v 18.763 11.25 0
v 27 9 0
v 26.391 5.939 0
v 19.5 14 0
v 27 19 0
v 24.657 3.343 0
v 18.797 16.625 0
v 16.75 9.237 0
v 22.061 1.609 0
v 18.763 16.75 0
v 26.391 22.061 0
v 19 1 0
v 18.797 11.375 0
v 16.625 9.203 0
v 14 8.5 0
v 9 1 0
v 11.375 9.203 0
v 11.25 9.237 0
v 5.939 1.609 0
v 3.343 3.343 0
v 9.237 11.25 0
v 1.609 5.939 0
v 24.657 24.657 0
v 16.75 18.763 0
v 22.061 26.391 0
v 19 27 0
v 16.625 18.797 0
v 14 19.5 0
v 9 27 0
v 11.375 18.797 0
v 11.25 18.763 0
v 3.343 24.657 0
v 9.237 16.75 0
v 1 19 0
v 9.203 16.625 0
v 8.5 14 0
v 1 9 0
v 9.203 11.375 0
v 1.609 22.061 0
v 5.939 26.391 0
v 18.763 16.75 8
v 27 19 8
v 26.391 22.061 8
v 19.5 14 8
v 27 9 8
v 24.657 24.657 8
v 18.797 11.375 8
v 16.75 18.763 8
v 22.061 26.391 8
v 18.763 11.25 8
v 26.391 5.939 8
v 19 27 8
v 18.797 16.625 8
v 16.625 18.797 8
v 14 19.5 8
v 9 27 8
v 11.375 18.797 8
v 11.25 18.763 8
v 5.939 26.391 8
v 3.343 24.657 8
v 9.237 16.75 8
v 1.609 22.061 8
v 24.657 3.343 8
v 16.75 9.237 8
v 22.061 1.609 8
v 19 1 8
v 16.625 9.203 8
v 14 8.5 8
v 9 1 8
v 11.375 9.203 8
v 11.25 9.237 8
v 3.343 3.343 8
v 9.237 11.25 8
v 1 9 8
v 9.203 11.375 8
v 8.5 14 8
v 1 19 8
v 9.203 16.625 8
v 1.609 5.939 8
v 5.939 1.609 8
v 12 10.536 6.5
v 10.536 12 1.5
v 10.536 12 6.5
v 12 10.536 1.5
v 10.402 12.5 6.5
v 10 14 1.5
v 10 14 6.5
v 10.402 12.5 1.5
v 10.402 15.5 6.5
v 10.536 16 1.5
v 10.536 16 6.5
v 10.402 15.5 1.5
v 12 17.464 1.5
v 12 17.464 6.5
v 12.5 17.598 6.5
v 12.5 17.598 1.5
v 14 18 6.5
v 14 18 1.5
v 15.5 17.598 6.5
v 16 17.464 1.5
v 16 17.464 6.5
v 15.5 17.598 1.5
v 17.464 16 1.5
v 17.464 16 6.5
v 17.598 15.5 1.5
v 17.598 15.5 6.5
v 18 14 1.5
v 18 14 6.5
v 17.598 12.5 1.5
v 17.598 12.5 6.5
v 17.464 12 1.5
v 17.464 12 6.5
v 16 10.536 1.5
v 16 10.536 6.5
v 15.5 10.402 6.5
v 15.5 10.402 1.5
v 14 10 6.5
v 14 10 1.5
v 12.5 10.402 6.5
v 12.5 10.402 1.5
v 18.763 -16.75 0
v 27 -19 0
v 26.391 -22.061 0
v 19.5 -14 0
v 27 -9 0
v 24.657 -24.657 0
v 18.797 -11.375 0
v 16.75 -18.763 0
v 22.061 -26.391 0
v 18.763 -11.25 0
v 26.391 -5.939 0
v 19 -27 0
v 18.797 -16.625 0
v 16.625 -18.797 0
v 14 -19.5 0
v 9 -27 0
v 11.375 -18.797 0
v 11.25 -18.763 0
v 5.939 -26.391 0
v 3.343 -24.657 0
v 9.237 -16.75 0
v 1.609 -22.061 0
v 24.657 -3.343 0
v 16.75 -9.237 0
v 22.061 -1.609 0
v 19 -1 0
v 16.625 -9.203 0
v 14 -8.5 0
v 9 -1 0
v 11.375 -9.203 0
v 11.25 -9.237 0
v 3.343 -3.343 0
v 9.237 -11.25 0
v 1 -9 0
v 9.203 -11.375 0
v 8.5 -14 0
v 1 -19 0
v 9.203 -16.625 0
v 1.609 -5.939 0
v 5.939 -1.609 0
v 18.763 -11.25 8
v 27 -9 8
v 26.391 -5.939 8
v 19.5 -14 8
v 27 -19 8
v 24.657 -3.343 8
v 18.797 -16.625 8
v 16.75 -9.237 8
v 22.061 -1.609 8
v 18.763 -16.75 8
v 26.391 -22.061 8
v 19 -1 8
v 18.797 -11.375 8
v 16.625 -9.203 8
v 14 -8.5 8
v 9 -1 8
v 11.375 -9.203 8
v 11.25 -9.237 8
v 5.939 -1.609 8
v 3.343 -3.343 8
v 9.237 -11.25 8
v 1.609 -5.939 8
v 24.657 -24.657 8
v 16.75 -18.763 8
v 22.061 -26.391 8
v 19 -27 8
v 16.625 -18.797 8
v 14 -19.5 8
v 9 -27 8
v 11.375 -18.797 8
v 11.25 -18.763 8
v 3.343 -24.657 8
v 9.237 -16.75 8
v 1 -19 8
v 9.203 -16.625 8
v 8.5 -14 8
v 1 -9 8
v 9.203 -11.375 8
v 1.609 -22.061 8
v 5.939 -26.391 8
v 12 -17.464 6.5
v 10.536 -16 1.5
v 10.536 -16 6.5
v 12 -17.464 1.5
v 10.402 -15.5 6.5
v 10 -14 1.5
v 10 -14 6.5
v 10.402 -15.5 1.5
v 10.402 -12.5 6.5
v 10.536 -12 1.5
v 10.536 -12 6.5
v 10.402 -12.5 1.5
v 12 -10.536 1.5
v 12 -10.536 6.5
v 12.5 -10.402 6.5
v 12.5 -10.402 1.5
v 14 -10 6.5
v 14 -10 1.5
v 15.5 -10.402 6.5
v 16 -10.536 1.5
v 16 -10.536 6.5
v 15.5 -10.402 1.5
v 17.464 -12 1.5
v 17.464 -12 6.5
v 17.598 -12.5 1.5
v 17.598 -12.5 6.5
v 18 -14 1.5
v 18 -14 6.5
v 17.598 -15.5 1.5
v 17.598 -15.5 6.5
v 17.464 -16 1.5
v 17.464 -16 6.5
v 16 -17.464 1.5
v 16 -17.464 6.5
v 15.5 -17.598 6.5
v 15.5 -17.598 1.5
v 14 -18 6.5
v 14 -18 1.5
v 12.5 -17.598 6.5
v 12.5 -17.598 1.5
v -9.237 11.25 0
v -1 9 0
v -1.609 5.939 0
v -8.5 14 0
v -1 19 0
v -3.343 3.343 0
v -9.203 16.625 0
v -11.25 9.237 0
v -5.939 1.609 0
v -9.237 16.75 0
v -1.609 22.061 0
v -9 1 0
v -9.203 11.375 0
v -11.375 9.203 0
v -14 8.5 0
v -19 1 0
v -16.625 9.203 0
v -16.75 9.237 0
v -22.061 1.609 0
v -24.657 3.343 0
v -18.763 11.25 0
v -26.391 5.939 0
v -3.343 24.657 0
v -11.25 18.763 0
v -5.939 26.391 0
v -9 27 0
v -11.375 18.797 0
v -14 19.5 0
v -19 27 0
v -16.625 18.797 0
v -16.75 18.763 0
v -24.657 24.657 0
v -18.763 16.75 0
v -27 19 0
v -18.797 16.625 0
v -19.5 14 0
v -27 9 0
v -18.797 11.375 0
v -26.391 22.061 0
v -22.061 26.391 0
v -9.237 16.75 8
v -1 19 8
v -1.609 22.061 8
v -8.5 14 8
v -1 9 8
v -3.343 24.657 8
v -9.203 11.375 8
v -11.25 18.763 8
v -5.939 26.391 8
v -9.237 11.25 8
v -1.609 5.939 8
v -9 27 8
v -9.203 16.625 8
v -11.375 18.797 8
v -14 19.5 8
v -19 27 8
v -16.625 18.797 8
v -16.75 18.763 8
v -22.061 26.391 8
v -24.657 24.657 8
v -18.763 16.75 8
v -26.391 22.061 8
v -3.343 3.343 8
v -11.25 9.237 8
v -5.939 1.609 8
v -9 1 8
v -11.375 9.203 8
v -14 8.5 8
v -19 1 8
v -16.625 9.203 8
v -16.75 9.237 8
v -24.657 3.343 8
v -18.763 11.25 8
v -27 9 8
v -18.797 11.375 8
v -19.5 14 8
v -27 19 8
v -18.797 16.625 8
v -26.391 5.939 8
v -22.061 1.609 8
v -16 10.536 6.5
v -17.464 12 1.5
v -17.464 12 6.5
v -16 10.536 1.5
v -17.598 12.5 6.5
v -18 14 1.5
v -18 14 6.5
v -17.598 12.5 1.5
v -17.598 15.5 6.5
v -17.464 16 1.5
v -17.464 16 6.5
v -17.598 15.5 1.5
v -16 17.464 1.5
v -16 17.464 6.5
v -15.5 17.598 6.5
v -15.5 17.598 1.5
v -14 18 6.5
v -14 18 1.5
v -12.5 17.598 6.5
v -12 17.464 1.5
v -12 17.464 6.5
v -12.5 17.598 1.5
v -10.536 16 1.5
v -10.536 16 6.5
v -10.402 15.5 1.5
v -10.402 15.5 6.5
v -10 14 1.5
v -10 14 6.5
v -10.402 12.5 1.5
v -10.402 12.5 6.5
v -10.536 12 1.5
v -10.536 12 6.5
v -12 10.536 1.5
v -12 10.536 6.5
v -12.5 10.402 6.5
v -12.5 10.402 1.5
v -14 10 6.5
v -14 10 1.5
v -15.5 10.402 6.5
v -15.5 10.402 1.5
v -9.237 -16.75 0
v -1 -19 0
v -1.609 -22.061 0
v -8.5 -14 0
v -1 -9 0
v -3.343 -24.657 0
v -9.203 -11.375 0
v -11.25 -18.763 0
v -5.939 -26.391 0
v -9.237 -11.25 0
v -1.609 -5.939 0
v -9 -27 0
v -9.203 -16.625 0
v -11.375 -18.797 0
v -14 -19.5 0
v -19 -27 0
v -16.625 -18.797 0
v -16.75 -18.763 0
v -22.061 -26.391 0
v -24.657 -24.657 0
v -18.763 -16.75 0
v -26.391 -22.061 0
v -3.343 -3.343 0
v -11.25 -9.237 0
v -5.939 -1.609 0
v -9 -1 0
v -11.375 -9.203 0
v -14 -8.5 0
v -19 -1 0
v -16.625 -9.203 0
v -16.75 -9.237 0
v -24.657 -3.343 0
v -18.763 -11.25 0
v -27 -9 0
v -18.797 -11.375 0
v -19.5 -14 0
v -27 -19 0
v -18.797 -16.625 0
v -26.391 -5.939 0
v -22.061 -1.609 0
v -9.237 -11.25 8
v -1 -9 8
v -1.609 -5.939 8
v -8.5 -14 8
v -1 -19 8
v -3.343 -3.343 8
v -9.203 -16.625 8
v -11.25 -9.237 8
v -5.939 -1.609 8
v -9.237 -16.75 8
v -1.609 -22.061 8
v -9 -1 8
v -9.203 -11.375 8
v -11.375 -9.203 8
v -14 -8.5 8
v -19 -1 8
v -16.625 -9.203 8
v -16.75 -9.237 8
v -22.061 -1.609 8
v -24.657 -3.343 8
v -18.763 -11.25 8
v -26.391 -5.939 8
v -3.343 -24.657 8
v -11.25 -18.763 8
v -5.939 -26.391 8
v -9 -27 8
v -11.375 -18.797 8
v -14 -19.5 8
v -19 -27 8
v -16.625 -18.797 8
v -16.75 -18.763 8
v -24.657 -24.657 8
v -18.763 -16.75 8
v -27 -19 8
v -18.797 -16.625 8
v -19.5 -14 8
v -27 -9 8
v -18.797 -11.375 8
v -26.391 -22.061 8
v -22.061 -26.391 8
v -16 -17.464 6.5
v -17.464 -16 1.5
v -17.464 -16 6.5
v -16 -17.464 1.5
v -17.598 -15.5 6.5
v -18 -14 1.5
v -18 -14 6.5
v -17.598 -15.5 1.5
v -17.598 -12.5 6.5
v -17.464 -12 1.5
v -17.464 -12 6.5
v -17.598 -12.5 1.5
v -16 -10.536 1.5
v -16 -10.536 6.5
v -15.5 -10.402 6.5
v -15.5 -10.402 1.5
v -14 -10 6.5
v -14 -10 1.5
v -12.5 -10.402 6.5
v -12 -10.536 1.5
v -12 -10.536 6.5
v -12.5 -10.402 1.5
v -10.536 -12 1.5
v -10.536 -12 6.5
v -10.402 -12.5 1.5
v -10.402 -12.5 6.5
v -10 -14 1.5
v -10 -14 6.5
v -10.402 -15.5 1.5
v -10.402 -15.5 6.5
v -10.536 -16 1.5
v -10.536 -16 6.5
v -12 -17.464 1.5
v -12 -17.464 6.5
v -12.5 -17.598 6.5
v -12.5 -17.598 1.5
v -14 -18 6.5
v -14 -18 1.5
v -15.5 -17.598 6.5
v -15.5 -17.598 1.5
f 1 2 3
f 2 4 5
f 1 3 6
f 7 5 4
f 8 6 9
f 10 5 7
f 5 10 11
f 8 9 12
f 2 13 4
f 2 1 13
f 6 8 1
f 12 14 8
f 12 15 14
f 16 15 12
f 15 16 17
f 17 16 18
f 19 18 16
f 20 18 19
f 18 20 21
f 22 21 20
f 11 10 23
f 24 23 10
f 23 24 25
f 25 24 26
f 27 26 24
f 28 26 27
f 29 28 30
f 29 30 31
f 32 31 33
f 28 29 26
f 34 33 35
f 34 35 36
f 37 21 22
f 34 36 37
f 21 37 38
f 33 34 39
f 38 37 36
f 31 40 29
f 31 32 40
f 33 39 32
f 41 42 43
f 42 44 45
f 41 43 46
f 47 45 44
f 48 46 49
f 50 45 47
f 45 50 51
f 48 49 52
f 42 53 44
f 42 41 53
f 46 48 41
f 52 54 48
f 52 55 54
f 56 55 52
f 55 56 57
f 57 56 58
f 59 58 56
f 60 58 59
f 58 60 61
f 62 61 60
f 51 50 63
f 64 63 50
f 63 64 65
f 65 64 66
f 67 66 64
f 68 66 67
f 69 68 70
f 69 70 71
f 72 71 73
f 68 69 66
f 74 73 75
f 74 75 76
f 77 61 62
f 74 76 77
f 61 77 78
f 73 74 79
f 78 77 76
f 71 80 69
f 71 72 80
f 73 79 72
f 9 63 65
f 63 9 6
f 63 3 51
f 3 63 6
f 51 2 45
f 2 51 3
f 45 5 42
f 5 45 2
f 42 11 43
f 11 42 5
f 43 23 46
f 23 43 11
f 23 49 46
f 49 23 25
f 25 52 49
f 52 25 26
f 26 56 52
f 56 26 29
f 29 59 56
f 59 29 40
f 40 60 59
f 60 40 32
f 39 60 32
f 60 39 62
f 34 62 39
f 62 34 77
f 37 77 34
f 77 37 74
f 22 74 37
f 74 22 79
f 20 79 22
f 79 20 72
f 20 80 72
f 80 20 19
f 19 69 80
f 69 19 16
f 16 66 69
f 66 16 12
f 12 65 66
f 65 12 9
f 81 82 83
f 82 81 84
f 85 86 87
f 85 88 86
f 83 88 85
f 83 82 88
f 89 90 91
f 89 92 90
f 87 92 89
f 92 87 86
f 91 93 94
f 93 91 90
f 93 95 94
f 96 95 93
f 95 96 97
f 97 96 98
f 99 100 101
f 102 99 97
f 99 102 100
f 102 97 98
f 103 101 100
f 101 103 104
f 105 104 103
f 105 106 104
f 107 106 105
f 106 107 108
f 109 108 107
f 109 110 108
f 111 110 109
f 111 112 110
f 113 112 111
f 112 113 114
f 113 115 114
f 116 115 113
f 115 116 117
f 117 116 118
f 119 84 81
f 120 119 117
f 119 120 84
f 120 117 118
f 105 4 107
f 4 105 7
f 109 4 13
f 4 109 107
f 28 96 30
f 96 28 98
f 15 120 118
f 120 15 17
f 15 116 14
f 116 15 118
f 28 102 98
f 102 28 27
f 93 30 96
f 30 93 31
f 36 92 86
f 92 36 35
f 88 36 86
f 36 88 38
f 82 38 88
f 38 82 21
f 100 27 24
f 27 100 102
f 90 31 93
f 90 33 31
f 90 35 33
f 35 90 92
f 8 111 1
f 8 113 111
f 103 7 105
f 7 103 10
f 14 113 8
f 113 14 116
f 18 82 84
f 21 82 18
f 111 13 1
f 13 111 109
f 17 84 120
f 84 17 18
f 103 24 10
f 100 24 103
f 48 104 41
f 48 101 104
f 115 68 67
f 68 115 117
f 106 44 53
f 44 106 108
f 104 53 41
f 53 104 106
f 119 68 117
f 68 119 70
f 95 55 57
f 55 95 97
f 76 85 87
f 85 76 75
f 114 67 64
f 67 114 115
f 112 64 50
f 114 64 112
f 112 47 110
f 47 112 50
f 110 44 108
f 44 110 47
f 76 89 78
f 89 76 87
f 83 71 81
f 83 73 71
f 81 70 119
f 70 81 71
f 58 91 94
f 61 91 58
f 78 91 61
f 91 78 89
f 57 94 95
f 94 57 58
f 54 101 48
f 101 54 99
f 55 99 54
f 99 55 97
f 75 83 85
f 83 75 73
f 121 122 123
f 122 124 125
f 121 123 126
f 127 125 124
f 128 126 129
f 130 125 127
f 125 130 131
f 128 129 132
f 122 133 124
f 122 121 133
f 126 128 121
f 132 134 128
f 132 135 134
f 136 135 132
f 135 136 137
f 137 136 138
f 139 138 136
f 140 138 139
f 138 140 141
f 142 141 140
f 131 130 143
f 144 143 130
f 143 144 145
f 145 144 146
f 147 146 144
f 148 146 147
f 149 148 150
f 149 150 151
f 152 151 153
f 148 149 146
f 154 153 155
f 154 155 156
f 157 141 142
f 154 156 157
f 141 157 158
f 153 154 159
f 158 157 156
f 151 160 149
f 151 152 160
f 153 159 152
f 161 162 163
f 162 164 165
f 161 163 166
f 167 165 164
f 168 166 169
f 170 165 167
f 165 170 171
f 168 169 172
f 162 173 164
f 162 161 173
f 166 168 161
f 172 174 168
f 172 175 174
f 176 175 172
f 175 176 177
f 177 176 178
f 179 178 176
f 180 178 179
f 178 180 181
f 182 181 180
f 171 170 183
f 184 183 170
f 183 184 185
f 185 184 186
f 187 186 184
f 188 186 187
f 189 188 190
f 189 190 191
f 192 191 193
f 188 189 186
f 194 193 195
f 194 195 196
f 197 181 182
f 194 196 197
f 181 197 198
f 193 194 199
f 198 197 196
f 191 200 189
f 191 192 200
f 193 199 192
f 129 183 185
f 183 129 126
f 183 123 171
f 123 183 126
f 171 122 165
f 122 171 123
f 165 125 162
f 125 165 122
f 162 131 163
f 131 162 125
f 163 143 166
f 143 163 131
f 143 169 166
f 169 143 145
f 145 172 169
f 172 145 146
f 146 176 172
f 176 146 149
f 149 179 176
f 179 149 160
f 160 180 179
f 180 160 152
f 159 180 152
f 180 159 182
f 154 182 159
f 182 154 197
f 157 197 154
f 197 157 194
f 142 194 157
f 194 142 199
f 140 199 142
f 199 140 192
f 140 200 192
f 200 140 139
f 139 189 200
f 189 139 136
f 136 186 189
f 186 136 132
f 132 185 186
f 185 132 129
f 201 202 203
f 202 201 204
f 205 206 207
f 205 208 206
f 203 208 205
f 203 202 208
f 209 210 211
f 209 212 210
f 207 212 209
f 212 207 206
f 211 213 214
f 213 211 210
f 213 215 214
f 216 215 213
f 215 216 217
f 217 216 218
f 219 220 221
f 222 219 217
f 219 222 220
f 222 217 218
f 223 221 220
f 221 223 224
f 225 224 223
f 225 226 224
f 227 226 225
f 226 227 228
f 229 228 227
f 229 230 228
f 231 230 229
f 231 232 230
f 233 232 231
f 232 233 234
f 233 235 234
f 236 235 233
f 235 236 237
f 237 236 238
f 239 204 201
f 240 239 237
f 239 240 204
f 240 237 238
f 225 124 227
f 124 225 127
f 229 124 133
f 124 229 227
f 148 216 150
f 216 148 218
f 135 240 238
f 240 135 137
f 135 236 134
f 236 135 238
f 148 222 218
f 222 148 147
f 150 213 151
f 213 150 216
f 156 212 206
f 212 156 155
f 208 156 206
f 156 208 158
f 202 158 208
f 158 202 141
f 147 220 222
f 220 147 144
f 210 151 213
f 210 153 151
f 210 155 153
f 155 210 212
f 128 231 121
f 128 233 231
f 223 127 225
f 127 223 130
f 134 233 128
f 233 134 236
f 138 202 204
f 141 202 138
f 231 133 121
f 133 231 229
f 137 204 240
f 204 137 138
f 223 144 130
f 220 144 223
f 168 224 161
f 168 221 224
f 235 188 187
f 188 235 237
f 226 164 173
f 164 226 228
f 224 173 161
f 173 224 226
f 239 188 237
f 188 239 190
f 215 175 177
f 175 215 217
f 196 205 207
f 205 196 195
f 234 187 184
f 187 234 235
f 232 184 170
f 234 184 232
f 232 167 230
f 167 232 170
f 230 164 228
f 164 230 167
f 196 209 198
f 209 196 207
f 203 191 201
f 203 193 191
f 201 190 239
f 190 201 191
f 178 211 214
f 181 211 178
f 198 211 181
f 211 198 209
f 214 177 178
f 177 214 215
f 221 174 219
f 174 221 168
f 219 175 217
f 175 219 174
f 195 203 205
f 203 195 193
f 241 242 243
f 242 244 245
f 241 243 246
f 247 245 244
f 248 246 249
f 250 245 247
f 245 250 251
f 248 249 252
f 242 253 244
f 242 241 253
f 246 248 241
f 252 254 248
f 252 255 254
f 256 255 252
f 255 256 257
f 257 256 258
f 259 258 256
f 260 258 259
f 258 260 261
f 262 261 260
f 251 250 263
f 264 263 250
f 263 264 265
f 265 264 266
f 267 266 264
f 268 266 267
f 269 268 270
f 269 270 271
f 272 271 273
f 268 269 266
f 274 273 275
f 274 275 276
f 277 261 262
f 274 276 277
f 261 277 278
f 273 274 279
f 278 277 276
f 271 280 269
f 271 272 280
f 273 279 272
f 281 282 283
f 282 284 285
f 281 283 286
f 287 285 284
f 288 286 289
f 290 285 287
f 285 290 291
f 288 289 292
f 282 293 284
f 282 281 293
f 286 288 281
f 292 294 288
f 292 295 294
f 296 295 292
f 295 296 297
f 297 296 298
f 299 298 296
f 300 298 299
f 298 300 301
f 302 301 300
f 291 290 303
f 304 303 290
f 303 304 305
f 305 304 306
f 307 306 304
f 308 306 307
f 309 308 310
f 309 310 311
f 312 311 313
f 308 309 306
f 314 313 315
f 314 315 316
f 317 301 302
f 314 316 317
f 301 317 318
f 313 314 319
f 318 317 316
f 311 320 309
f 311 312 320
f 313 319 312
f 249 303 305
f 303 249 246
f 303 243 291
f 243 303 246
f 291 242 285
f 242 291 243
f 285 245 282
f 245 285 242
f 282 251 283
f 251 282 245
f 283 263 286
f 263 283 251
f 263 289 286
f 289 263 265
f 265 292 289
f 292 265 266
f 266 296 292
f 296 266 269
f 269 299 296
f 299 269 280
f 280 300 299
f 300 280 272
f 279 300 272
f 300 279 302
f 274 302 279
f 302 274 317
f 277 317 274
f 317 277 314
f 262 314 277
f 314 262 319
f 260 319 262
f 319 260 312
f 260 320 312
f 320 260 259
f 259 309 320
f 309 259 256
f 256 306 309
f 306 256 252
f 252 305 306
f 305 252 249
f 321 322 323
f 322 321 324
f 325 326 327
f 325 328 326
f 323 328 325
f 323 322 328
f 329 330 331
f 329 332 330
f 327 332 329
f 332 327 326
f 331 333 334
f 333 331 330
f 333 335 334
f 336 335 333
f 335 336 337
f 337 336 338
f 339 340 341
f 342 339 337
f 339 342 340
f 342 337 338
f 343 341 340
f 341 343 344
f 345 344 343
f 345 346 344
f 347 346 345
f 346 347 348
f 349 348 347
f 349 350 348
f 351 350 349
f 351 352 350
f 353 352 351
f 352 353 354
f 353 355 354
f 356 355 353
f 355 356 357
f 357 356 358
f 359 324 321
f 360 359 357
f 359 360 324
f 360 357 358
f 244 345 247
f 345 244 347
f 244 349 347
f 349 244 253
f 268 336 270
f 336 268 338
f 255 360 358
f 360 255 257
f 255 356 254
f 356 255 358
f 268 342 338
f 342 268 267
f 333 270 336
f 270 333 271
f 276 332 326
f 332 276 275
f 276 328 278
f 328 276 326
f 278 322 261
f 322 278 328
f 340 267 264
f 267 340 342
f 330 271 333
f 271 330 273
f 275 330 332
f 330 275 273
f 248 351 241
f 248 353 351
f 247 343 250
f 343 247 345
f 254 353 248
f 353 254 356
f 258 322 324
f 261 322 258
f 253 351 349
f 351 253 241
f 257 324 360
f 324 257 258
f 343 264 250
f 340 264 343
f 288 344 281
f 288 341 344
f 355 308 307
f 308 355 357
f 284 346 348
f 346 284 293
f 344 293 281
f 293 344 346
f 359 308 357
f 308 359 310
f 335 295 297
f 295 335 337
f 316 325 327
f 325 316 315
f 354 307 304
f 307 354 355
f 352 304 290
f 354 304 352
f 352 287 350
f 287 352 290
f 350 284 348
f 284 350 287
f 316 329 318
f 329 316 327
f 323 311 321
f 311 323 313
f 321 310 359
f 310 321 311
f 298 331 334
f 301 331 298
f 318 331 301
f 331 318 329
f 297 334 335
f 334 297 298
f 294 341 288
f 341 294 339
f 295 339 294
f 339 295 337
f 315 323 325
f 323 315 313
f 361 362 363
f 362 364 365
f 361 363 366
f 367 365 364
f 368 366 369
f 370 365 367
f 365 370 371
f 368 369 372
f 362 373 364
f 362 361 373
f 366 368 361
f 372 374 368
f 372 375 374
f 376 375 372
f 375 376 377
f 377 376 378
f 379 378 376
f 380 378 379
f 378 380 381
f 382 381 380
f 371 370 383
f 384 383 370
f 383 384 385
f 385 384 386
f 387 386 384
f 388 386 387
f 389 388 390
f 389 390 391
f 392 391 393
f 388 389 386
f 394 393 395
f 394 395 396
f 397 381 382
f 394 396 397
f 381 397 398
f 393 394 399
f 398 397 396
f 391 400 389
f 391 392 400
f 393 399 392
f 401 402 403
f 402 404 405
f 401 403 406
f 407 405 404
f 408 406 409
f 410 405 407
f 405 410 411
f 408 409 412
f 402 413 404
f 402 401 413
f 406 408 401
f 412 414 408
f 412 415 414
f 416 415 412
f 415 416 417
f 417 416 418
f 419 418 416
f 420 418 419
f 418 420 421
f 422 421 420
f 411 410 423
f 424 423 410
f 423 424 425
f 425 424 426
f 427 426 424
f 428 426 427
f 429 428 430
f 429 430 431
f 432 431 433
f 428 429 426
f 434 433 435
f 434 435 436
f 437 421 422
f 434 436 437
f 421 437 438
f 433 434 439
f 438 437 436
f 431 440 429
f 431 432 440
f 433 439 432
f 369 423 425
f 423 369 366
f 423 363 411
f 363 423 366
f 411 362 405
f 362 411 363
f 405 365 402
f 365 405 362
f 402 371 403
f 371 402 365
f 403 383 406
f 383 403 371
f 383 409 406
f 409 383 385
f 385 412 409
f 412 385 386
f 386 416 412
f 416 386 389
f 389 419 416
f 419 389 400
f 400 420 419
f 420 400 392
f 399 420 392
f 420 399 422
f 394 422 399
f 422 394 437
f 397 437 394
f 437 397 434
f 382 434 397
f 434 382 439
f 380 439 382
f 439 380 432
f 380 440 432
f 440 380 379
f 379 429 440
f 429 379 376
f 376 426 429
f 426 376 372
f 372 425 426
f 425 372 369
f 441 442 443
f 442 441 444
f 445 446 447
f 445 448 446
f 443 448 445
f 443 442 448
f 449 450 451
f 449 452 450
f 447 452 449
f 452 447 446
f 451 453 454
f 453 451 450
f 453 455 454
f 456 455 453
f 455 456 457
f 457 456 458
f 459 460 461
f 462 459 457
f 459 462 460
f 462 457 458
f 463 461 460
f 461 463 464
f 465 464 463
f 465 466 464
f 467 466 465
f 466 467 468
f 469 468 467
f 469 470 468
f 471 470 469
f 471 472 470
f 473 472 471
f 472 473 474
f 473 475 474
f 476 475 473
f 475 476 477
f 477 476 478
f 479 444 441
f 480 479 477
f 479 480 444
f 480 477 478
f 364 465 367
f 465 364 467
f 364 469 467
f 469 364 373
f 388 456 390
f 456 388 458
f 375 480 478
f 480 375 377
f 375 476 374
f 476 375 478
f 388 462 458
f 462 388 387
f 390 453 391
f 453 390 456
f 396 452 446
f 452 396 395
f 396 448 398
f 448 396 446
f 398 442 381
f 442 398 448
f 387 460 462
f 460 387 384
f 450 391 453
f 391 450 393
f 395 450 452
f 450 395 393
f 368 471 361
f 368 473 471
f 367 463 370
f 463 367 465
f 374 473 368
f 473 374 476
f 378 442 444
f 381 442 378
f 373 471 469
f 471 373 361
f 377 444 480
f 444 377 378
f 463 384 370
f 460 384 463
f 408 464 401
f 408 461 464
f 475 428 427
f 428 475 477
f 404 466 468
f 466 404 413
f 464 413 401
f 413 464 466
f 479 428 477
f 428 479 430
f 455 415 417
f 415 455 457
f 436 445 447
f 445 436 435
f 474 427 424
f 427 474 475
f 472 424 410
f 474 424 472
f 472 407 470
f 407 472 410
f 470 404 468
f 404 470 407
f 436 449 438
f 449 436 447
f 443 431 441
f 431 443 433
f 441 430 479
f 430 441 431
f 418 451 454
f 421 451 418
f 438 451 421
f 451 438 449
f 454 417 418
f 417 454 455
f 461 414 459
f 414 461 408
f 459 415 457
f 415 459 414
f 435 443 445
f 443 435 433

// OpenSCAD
// file: settings.scad
rod_size = 8;
rod_nut_size = 15; //12 for M6, 15 for M8
bearing_size = 15.5; //12.5 for LM6UU, 15.5 for LM8UU,LM8SUU
bearing_length = 24.5; //19.5 for LM6UU, 17.5 for LM8SUU, 24.5 for LM8UU
yz_motor_distance = 25;
motor_screw_spacing = 26; //26 for NEMA14, 31 for NEMA17
motor_casing = 38; //38 for NEMA14, 45 for NEMA17
end_height = 40; //measure the height of your motor casing and add 4mm. Suggestion: 40 for NEMA14, 55 for NEMA17
bed_mount_height = 16;
//x_rod_spacing = motor_screw_spacing + 3 + rod_size;
x_rod_spacing = 30;
x_carriage_width = 70;
carriage_extruder_offset = 5;
pulley_size = 20;
idler_pulley_width = 10;
gusset_size = 15;
m3_size = 3;
m3_nut_size = 6;
m4_size = 4;
motor_shaft_size = 5;

// ratio for converting diameter to apothem
da6 = 1 / cos(180 / 6) / 2;
da8 = 1 / cos(180 / 8) / 2;
// main file
include <settings.scad>;

!for(x = [1, -1]) for(y = [1, -1]) translate([x * (rod_size * 1.5 + 2), y * (rod_size * 1.5 + 2), 0]) foot();

module foot() difference() {
	linear_extrude(height = rod_size, convexity = 5) difference() {
		minkowski() {
			square(rod_size + 2, center = true);
			circle(rod_size, $fn = 16);
		}
		circle(rod_size / 2, $fn = 12);
	}
	translate([0, 0, -rod_size / 16]) cylinder(r1 = rod_size * 3/4, r2 = rod_size / 4, h = rod_size / 2, $fn = 12);
	translate([0, 0, rod_size / 2 + rod_size / 16]) cylinder(r2 = rod_size * 3/4, r1 = rod_size / 4, h = rod_size / 2, $fn = 12);
}
